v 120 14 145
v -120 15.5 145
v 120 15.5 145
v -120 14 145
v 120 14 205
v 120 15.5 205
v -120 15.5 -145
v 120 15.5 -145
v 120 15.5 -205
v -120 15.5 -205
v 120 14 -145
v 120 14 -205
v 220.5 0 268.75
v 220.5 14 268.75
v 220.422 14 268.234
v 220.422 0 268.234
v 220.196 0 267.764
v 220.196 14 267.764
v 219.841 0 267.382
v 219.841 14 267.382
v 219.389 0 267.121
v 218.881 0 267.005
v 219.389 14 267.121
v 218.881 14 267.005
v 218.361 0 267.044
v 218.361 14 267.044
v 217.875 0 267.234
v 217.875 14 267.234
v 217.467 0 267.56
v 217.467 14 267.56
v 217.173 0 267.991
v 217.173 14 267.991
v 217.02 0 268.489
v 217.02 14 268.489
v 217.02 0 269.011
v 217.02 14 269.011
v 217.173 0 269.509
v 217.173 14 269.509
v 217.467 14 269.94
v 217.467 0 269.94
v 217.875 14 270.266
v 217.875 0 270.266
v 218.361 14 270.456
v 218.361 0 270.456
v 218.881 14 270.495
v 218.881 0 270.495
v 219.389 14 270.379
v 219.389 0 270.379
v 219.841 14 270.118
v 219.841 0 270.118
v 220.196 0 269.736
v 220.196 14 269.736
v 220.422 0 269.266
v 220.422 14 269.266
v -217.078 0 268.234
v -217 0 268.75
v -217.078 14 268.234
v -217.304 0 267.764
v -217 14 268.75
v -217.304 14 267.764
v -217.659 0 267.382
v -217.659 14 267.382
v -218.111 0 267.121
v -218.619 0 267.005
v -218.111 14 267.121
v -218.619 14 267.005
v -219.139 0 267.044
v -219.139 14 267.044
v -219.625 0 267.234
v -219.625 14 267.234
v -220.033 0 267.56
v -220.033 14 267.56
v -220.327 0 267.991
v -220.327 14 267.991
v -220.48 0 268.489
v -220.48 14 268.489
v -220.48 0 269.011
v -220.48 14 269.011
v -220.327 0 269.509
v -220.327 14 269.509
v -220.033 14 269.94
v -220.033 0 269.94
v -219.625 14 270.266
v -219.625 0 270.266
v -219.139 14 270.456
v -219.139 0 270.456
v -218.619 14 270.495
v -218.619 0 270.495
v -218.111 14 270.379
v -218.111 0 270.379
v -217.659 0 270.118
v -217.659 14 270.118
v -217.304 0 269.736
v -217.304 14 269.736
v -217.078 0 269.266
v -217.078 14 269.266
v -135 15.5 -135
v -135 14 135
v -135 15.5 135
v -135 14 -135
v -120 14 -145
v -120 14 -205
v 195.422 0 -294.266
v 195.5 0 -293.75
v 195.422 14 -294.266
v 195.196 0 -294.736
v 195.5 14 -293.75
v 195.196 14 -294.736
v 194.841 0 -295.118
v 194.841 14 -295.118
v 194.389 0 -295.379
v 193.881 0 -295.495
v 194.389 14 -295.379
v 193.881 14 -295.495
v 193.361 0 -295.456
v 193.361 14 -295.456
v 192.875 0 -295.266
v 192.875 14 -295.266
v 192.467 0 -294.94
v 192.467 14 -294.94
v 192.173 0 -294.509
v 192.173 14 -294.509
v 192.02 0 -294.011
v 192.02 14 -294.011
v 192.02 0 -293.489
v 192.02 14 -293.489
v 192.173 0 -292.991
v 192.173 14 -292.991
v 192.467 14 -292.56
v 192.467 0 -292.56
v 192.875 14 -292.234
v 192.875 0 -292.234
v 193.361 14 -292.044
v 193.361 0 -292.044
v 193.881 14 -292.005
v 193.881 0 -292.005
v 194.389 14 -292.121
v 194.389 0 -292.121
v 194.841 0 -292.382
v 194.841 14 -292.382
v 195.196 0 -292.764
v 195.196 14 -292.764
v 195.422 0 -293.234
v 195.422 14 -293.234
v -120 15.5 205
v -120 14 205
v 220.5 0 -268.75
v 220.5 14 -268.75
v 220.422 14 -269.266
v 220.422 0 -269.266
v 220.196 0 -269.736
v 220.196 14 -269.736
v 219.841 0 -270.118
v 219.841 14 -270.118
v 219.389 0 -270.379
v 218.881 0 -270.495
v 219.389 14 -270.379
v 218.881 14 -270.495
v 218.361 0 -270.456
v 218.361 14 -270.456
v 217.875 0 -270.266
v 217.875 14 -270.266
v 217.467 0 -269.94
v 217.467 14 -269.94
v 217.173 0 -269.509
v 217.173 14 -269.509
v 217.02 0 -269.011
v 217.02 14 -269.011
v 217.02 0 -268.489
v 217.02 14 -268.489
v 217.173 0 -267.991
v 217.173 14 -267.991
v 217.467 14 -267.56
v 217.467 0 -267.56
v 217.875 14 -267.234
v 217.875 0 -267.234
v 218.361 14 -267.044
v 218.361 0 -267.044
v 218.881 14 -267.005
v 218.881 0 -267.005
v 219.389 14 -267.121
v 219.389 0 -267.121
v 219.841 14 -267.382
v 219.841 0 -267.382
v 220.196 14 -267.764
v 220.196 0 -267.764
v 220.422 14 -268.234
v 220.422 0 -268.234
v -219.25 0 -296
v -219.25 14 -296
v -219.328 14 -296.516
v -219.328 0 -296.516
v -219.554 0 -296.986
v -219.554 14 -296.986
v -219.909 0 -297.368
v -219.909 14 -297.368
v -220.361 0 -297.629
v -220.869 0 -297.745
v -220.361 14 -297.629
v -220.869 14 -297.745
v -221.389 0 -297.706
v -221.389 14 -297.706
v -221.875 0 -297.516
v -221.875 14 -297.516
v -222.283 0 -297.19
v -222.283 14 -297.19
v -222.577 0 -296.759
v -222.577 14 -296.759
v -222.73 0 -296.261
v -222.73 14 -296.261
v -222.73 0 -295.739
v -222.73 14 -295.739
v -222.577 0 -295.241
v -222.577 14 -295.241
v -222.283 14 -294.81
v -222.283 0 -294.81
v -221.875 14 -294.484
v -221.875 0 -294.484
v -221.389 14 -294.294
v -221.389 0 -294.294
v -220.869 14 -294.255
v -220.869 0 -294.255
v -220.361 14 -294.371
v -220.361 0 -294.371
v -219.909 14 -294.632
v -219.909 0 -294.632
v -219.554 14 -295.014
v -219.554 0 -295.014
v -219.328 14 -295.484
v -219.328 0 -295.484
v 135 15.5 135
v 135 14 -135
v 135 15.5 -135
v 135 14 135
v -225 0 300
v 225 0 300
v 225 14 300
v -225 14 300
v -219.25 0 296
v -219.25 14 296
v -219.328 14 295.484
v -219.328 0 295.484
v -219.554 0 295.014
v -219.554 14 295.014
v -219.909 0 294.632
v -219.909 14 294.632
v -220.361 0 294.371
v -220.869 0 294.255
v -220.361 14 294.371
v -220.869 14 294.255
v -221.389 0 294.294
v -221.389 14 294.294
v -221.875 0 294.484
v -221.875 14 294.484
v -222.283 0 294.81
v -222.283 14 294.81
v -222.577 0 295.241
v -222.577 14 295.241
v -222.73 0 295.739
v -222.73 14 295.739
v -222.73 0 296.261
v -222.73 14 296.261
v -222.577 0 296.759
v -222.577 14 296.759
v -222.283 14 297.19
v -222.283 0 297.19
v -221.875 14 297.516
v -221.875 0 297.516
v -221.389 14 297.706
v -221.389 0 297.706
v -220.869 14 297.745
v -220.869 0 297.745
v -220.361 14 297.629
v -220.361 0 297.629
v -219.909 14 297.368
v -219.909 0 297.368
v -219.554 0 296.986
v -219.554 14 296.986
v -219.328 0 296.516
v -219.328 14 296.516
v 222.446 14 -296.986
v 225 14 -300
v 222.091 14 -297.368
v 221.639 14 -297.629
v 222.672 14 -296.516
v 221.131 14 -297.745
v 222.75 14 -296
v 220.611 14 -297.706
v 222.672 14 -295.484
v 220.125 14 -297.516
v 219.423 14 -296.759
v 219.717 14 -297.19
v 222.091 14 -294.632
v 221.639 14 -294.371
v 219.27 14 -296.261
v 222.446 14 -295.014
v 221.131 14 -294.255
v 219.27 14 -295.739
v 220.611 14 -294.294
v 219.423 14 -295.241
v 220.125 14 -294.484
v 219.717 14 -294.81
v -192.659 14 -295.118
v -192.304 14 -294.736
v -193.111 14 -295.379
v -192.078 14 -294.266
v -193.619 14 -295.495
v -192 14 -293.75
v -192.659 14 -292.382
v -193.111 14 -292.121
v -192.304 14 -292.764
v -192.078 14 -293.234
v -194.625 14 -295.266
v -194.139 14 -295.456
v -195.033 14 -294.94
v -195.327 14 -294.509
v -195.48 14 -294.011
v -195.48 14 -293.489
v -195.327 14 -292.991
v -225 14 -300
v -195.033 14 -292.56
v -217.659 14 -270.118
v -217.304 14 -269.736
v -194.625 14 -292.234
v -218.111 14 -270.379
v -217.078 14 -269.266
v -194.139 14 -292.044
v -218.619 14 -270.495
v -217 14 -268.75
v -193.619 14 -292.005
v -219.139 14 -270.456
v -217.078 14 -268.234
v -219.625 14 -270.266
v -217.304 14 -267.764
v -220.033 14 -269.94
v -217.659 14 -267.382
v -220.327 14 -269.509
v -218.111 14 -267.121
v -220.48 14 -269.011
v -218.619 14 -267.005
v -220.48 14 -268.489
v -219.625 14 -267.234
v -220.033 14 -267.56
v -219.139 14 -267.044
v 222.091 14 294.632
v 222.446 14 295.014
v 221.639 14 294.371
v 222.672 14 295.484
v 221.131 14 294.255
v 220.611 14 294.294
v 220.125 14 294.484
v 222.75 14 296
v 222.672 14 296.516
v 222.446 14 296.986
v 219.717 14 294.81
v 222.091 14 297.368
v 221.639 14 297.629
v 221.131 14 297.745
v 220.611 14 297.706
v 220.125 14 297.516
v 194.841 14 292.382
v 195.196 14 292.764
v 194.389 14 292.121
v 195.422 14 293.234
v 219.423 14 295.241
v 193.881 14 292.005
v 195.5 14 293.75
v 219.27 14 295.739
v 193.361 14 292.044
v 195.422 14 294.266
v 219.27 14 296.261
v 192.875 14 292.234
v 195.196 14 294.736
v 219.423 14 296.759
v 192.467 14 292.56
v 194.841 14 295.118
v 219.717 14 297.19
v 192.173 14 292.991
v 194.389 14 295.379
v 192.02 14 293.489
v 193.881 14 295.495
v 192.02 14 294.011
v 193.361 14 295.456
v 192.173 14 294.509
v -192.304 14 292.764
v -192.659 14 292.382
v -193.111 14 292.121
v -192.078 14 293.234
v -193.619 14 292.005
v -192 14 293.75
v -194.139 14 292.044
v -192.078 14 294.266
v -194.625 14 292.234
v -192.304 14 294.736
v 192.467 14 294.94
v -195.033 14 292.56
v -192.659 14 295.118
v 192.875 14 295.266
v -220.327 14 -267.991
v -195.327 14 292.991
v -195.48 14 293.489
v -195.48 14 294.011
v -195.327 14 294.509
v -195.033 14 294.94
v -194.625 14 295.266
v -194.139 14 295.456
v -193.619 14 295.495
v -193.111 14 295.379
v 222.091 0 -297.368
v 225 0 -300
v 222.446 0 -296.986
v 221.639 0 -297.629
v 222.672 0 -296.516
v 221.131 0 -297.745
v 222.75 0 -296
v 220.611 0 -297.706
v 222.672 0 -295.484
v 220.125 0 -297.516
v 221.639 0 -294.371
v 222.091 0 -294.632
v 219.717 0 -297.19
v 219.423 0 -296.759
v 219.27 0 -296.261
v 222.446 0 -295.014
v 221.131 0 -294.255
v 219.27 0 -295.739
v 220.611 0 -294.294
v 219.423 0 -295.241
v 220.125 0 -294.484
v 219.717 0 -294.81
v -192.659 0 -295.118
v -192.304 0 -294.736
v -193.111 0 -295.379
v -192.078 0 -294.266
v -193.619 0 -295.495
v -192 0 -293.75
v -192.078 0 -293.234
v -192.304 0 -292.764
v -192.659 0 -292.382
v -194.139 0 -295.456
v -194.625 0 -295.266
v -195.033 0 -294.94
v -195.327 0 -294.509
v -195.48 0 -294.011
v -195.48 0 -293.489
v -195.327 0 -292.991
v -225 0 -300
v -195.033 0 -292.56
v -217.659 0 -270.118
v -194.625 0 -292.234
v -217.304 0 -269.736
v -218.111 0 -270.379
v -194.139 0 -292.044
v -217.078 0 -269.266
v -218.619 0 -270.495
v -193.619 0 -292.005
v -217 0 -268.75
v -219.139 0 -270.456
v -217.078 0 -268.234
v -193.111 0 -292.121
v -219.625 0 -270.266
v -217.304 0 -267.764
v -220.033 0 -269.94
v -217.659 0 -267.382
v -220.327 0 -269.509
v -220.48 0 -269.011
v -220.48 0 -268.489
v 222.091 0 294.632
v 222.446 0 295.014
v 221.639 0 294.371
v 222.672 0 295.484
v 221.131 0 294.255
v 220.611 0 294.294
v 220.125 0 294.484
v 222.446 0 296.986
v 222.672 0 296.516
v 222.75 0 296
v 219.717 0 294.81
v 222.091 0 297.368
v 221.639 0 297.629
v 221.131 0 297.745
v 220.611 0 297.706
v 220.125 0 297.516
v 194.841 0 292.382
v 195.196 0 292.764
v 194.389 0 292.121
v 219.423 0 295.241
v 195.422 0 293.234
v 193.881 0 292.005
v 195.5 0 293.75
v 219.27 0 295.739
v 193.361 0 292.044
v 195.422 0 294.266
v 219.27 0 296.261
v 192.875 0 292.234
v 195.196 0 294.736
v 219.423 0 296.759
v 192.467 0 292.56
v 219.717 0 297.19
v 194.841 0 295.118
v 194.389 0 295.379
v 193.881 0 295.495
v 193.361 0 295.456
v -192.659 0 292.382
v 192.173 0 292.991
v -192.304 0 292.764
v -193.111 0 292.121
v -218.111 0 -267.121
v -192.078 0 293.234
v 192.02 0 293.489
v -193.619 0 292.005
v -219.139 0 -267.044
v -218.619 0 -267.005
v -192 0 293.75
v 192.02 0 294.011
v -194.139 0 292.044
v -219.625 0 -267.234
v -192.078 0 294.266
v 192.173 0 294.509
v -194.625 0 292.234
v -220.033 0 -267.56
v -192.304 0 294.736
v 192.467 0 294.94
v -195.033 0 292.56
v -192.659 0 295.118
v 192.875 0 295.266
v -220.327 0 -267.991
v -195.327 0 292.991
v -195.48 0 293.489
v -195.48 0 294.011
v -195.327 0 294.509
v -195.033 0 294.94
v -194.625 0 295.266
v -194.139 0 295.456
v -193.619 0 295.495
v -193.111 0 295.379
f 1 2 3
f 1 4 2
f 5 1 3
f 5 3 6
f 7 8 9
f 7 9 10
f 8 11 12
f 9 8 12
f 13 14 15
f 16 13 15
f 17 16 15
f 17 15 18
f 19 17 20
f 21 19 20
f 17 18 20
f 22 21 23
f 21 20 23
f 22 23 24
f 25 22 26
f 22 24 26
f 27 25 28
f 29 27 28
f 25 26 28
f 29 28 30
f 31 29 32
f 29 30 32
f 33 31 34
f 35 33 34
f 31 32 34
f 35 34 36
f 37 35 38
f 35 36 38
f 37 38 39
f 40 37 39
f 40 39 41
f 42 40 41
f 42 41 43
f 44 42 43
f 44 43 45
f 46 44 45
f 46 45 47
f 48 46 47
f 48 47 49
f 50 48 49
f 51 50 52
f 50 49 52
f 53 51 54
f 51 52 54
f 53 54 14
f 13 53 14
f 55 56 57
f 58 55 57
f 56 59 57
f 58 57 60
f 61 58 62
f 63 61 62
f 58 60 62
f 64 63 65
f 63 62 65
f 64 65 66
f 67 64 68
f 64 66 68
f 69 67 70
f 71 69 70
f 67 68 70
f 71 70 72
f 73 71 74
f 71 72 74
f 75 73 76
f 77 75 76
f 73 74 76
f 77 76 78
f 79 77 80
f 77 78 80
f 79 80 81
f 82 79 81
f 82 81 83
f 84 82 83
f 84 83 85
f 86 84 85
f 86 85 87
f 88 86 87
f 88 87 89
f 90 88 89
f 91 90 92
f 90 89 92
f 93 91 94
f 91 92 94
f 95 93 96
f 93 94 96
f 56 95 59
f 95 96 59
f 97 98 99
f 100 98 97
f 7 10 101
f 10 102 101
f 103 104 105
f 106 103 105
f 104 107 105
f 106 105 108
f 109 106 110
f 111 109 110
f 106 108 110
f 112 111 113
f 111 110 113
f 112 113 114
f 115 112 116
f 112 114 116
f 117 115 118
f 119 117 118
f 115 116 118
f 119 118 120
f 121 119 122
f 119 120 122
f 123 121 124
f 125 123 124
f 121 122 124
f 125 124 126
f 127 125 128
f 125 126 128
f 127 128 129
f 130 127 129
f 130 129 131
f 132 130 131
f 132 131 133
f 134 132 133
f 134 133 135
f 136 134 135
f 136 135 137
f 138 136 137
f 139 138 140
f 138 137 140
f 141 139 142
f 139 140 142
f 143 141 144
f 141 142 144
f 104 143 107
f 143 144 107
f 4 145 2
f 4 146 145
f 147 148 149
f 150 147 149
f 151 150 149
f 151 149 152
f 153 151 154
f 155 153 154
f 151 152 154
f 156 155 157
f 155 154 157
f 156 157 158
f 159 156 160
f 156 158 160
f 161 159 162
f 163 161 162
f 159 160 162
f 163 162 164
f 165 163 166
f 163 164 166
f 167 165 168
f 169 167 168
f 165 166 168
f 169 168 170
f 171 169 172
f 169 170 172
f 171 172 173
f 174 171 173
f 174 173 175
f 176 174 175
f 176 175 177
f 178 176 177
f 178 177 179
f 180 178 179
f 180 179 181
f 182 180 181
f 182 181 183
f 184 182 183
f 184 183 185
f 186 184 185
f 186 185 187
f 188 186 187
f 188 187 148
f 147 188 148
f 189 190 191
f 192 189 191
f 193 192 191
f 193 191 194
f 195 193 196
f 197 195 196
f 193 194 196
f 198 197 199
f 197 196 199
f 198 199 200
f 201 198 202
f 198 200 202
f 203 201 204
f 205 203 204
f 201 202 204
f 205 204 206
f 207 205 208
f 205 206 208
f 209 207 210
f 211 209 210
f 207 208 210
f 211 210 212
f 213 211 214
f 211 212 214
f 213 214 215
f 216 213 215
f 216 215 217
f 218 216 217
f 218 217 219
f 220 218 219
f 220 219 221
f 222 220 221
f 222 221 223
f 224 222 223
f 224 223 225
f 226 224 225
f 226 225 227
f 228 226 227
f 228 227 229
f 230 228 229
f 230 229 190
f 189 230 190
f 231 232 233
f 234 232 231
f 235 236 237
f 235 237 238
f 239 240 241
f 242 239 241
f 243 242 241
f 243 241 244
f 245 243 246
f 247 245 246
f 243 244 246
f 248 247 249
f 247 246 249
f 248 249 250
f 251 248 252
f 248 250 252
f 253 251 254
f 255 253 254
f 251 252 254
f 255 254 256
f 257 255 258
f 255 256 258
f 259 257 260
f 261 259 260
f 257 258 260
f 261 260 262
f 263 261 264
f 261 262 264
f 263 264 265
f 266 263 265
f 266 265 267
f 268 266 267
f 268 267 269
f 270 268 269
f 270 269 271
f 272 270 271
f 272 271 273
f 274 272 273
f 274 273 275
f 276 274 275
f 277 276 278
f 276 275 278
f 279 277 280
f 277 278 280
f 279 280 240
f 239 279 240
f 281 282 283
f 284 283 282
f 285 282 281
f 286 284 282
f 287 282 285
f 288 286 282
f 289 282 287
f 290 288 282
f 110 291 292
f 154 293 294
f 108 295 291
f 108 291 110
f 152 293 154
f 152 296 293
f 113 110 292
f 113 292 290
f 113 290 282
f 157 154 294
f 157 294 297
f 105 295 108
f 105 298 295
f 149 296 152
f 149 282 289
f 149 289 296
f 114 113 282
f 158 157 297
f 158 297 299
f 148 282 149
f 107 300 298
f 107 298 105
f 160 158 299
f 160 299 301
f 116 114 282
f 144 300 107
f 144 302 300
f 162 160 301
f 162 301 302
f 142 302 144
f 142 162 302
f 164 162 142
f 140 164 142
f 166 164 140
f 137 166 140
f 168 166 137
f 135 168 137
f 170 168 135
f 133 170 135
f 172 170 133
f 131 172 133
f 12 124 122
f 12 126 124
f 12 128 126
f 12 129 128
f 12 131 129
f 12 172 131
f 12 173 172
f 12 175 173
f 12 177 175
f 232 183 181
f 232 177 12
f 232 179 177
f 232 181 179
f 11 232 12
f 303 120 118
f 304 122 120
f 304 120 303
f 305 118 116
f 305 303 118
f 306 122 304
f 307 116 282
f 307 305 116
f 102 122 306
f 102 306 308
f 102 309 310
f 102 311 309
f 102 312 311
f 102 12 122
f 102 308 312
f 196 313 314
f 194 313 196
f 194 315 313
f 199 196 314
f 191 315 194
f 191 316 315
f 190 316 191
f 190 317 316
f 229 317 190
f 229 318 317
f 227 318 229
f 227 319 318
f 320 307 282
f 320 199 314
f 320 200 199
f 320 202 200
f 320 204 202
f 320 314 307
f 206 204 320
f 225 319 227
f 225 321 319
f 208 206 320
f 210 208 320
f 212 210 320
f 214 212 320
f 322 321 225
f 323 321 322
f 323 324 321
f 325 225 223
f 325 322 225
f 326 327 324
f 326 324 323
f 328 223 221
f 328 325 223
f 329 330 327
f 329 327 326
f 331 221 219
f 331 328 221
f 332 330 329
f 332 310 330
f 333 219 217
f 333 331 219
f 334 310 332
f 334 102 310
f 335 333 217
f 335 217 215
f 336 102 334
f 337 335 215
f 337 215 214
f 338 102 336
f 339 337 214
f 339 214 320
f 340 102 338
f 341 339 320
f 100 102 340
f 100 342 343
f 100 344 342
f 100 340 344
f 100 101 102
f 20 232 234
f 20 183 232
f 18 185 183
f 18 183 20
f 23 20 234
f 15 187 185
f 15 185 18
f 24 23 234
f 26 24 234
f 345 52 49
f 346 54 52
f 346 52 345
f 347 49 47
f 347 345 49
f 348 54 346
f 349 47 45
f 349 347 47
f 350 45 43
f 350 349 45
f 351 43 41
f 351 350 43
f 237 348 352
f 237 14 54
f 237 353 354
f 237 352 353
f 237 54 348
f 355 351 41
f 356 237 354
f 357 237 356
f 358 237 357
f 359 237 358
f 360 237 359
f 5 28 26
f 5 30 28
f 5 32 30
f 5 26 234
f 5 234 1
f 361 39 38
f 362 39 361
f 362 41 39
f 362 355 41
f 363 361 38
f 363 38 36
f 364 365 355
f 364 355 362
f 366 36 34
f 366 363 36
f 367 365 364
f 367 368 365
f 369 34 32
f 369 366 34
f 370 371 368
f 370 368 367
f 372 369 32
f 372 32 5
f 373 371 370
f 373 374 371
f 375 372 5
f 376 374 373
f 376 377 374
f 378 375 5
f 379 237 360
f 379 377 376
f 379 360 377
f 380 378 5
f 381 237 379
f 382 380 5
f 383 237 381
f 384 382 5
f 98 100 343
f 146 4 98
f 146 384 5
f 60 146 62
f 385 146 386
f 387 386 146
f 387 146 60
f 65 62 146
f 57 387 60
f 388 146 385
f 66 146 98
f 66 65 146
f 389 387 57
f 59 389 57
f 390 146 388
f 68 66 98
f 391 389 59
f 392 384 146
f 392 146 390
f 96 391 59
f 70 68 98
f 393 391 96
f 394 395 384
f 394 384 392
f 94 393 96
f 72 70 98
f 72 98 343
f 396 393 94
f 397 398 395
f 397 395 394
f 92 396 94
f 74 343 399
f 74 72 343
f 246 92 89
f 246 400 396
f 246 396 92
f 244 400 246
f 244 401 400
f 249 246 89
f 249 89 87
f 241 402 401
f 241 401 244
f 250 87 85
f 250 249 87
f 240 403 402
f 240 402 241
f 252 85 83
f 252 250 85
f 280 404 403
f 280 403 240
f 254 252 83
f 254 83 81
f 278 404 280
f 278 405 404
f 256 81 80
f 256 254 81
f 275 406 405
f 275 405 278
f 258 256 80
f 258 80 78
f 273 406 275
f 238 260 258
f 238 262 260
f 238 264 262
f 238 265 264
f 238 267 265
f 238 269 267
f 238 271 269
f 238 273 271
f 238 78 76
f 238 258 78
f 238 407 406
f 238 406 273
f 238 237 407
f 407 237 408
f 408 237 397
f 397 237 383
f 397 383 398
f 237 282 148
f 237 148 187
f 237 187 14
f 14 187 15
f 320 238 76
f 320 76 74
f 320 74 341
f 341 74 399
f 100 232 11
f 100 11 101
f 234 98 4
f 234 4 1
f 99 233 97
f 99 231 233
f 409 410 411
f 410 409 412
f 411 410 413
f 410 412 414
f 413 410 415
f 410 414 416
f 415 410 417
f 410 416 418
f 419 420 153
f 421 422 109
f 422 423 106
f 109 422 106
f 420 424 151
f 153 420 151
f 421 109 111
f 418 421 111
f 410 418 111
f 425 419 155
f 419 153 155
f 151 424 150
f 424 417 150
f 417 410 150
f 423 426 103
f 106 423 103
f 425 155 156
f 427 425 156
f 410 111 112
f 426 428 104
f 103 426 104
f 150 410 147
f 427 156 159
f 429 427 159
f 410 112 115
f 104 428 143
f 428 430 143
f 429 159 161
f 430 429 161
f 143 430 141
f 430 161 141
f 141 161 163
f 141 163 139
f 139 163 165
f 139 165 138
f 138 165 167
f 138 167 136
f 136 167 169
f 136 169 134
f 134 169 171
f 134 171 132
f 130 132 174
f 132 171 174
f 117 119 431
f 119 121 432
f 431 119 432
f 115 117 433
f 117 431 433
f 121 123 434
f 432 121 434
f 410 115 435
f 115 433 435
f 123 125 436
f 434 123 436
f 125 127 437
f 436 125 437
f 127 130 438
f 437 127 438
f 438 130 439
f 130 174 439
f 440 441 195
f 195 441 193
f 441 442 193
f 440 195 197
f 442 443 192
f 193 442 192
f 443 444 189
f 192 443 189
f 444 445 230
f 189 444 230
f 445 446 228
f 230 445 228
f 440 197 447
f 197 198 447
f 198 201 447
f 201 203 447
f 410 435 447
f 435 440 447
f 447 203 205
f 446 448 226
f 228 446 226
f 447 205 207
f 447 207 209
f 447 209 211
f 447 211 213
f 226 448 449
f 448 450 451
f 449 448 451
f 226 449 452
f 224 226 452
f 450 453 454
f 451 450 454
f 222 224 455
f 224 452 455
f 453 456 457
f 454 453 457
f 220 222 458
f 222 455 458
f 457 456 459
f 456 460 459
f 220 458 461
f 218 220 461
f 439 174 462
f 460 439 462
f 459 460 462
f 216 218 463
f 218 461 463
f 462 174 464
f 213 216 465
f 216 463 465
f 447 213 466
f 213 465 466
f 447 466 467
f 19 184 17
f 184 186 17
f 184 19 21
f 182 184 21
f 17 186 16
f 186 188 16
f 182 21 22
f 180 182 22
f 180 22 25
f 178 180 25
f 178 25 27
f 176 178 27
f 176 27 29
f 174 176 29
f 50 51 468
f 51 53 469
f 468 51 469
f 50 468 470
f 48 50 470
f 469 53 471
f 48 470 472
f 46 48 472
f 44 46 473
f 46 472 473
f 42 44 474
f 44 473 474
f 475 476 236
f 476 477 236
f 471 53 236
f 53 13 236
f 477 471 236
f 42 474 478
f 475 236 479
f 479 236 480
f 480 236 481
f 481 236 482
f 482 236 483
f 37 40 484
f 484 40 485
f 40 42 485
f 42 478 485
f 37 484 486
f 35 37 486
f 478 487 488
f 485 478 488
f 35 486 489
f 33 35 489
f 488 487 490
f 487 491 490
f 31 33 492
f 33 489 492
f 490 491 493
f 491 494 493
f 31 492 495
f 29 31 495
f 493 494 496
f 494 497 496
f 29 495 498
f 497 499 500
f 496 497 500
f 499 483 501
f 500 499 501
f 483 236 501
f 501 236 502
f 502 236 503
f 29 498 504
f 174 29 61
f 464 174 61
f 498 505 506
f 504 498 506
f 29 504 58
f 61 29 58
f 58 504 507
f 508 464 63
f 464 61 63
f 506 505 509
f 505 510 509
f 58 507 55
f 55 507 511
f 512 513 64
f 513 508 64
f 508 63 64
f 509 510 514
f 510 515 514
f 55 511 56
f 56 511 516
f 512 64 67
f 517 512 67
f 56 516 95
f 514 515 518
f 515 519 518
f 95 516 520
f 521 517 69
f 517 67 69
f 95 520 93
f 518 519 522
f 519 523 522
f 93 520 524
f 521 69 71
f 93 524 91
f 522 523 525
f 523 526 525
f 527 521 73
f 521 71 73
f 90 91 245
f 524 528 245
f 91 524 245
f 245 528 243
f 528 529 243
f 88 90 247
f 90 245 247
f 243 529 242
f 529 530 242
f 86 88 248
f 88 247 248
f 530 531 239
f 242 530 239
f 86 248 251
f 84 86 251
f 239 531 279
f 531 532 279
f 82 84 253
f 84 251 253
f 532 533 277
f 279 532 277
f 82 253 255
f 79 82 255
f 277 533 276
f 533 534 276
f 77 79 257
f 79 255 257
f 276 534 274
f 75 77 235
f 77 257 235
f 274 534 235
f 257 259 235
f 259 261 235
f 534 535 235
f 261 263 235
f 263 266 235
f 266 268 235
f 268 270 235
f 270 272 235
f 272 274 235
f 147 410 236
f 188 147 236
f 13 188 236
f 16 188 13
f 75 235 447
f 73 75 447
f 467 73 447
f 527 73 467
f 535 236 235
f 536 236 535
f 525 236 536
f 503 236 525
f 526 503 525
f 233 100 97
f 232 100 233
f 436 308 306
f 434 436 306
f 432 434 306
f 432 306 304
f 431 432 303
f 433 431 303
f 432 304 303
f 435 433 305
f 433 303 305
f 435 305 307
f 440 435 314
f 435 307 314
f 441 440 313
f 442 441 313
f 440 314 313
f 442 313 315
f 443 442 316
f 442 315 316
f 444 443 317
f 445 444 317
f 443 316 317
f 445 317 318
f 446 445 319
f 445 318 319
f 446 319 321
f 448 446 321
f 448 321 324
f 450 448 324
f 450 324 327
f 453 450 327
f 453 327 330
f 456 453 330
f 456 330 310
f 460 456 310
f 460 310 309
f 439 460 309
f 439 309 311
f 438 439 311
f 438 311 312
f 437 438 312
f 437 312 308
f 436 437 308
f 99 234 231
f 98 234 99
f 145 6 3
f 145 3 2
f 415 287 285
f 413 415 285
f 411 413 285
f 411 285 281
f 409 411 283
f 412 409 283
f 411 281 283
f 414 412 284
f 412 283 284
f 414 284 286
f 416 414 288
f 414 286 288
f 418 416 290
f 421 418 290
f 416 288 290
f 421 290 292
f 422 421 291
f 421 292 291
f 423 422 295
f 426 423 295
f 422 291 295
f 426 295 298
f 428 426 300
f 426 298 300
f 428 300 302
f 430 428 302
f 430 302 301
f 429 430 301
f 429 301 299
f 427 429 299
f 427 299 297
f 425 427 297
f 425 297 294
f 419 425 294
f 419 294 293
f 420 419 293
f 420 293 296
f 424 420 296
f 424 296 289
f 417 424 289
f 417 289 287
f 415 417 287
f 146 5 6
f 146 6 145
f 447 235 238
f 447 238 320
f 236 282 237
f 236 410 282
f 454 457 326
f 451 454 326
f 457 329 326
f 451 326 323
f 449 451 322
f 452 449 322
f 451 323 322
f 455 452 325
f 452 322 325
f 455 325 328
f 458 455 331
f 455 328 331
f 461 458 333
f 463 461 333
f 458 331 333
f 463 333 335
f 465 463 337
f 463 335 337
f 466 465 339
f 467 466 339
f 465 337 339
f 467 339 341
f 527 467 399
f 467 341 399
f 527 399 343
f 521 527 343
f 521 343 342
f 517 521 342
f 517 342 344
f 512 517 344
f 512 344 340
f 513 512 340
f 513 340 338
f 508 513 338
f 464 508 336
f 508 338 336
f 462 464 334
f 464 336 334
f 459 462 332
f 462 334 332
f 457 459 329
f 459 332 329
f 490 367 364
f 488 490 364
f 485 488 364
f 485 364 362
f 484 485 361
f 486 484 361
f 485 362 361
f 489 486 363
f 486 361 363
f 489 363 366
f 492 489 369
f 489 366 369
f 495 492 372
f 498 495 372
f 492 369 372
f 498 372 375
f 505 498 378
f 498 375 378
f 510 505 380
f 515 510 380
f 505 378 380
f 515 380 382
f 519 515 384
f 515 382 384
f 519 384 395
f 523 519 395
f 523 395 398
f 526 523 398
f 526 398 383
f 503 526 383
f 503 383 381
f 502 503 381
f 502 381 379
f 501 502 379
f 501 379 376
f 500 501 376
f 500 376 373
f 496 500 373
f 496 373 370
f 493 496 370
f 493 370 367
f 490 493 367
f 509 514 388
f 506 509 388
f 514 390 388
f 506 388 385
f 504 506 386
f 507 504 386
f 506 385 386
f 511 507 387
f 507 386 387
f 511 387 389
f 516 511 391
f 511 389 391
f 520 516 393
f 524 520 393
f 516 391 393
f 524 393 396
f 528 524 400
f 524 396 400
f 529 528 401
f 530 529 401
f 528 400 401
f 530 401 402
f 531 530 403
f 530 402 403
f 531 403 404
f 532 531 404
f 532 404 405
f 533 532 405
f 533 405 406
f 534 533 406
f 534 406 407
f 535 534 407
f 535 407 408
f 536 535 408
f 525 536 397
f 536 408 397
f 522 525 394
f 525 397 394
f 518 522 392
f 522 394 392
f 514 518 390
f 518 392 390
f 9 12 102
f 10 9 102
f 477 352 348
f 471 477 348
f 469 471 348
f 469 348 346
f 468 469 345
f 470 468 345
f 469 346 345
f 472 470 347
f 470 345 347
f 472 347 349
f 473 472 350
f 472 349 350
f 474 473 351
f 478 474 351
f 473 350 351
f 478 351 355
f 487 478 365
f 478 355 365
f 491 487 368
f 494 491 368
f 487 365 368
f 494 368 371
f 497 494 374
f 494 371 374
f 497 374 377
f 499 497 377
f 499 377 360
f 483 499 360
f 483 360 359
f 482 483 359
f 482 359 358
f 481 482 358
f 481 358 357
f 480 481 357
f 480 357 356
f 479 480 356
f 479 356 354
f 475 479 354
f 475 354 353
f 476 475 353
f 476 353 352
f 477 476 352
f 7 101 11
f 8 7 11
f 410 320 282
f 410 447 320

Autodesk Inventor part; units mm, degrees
ref_plane "YZ Plane" through (0, 0, 0) normal (1, 0, 0) x (0, 1, 0)
ref_plane "XZ Plane" through (0, 0, 0) normal (0, 1, 0) x (-1, 0, 0)
ref_plane "XY Plane" through (0, 0, 0) normal (0, 0, 1) x (1, 0, 0)
sketch "Эскиз1" plane through (0, 0, 0) normal (0, 1, 0) x (-1, 0, 0)
  line L0 (-225, 300) -> (225, 300)
  line L1 (225, 300) -> (225, -300)
  line L2 (225, -300) -> (-225, -300)
  line L3 (-225, -300) -> (-225, 300)
  line L4 (-225, 300) -> (225, -300) construction
  line L5 (225, 300) -> (-225, -300) construction
  line L6 (-135, 135) -> (135, 135)
  line L7 (135, 135) -> (135, -135)
  line L8 (135, -135) -> (-135, -135)
  line L9 (-135, -135) -> (-135, 135)
  line L10 (-135, 135) -> (135, -135) construction
  line L11 (135, 135) -> (-135, -135) construction
  line L12 (120, 145) -> (-120, 145)
  line L13 (-120, 145) -> (-120, 205)
  line L14 (-120, 205) -> (120, 205)
  line L15 (120, 205) -> (120, 145)
  line L16 (120, -145) -> (-120, -145)
  line L17 (-120, -145) -> (-120, -205)
  line L18 (-120, -205) -> (120, -205)
  line L19 (120, -205) -> (120, -145)
  point P0 (0, 0)
  dimension "d0" = 450
  dimension "d1" = 600
  dimension "d2" = 270
  dimension "d3" = 270
  dimension "d7" = 240
  dimension "d8" = 60
  dimension "d9" = 60
  dimension "d10" = 15
  dimension "d11" = 10
  dimension "d12" = 10
  dimension "d13" = 15
extrude "Выдавливание1" add sketch "Эскиз1" along normal blind 14
extrude "Выдавливание2" add sketch "Эскиз1" along normal blind 15.5 contours L6 L7 L8 L9 | L12 L13 L14 L15 | L19 L18 L17 L16
sketch "Эскиз2" plane through (0, 14, 0) normal (0, 1, 0) x (1, 0, 0)
  circle A0 centre (-193.75, 293.75) radius 1.75
  circle A1 centre (-218.75, 268.75) radius 1.75
  circle A2 centre (-221, 296) radius 1.75
  circle A3 centre (221, 296) radius 1.75
  circle A4 centre (218.75, 268.75) radius 1.75
  circle A5 centre (193.75, 293.75) radius 1.75
  circle A6 centre (218.75, -268.75) radius 1.75
  circle A7 centre (221, -296) radius 1.75
  circle A8 centre (193.75, -293.75) radius 1.75
  circle A9 centre (-218.75, -268.75) radius 1.75
  circle A10 centre (-221, -296) radius 1.75
  circle A11 centre (-193.75, -293.75) radius 1.75
  line L0 (225, 300) -> (-225, 300) projected
  line L1 (-225, 300) -> (-225, -300) projected
  line L2 (225, -300) -> (225, 300) projected
  line L3 (-225, -300) -> (225, -300) projected
  point P0 (0, 0)
  dimension "d20" = 27.25
  dimension "d21" = 27.25
  dimension "d22" = 2.25
  dimension "d23" = 2.25
  dimension "d24" = 4
  dimension "d25" = 4
  dimension "d26" = 27.25
  dimension "d27" = 27.25
  dimension "d28" = 2.25
  dimension "d29" = 2.25
  dimension "d30" = 4
  dimension "d31" = 4
  dimension "d32" = 27.25
  dimension "d33" = 27.25
  dimension "d34" = 2.25
  dimension "d35" = 2.25
  dimension "d36" = 4
  dimension "d37" = 4
  dimension "d38" = 27.25
  dimension "d39" = 27.25
  dimension "d40" = 2.25
  dimension "d41" = 2.25
  dimension "d42" = 4
  dimension "d43" = 4
extrude "Выдавливание3" cut sketch "Эскиз2" against normal through all contours A0 | A1 | A2 | A3 | A4 | A5 | A6 | A7 | A8 | A9 | A10 | A11
properties part number "base_plate"
